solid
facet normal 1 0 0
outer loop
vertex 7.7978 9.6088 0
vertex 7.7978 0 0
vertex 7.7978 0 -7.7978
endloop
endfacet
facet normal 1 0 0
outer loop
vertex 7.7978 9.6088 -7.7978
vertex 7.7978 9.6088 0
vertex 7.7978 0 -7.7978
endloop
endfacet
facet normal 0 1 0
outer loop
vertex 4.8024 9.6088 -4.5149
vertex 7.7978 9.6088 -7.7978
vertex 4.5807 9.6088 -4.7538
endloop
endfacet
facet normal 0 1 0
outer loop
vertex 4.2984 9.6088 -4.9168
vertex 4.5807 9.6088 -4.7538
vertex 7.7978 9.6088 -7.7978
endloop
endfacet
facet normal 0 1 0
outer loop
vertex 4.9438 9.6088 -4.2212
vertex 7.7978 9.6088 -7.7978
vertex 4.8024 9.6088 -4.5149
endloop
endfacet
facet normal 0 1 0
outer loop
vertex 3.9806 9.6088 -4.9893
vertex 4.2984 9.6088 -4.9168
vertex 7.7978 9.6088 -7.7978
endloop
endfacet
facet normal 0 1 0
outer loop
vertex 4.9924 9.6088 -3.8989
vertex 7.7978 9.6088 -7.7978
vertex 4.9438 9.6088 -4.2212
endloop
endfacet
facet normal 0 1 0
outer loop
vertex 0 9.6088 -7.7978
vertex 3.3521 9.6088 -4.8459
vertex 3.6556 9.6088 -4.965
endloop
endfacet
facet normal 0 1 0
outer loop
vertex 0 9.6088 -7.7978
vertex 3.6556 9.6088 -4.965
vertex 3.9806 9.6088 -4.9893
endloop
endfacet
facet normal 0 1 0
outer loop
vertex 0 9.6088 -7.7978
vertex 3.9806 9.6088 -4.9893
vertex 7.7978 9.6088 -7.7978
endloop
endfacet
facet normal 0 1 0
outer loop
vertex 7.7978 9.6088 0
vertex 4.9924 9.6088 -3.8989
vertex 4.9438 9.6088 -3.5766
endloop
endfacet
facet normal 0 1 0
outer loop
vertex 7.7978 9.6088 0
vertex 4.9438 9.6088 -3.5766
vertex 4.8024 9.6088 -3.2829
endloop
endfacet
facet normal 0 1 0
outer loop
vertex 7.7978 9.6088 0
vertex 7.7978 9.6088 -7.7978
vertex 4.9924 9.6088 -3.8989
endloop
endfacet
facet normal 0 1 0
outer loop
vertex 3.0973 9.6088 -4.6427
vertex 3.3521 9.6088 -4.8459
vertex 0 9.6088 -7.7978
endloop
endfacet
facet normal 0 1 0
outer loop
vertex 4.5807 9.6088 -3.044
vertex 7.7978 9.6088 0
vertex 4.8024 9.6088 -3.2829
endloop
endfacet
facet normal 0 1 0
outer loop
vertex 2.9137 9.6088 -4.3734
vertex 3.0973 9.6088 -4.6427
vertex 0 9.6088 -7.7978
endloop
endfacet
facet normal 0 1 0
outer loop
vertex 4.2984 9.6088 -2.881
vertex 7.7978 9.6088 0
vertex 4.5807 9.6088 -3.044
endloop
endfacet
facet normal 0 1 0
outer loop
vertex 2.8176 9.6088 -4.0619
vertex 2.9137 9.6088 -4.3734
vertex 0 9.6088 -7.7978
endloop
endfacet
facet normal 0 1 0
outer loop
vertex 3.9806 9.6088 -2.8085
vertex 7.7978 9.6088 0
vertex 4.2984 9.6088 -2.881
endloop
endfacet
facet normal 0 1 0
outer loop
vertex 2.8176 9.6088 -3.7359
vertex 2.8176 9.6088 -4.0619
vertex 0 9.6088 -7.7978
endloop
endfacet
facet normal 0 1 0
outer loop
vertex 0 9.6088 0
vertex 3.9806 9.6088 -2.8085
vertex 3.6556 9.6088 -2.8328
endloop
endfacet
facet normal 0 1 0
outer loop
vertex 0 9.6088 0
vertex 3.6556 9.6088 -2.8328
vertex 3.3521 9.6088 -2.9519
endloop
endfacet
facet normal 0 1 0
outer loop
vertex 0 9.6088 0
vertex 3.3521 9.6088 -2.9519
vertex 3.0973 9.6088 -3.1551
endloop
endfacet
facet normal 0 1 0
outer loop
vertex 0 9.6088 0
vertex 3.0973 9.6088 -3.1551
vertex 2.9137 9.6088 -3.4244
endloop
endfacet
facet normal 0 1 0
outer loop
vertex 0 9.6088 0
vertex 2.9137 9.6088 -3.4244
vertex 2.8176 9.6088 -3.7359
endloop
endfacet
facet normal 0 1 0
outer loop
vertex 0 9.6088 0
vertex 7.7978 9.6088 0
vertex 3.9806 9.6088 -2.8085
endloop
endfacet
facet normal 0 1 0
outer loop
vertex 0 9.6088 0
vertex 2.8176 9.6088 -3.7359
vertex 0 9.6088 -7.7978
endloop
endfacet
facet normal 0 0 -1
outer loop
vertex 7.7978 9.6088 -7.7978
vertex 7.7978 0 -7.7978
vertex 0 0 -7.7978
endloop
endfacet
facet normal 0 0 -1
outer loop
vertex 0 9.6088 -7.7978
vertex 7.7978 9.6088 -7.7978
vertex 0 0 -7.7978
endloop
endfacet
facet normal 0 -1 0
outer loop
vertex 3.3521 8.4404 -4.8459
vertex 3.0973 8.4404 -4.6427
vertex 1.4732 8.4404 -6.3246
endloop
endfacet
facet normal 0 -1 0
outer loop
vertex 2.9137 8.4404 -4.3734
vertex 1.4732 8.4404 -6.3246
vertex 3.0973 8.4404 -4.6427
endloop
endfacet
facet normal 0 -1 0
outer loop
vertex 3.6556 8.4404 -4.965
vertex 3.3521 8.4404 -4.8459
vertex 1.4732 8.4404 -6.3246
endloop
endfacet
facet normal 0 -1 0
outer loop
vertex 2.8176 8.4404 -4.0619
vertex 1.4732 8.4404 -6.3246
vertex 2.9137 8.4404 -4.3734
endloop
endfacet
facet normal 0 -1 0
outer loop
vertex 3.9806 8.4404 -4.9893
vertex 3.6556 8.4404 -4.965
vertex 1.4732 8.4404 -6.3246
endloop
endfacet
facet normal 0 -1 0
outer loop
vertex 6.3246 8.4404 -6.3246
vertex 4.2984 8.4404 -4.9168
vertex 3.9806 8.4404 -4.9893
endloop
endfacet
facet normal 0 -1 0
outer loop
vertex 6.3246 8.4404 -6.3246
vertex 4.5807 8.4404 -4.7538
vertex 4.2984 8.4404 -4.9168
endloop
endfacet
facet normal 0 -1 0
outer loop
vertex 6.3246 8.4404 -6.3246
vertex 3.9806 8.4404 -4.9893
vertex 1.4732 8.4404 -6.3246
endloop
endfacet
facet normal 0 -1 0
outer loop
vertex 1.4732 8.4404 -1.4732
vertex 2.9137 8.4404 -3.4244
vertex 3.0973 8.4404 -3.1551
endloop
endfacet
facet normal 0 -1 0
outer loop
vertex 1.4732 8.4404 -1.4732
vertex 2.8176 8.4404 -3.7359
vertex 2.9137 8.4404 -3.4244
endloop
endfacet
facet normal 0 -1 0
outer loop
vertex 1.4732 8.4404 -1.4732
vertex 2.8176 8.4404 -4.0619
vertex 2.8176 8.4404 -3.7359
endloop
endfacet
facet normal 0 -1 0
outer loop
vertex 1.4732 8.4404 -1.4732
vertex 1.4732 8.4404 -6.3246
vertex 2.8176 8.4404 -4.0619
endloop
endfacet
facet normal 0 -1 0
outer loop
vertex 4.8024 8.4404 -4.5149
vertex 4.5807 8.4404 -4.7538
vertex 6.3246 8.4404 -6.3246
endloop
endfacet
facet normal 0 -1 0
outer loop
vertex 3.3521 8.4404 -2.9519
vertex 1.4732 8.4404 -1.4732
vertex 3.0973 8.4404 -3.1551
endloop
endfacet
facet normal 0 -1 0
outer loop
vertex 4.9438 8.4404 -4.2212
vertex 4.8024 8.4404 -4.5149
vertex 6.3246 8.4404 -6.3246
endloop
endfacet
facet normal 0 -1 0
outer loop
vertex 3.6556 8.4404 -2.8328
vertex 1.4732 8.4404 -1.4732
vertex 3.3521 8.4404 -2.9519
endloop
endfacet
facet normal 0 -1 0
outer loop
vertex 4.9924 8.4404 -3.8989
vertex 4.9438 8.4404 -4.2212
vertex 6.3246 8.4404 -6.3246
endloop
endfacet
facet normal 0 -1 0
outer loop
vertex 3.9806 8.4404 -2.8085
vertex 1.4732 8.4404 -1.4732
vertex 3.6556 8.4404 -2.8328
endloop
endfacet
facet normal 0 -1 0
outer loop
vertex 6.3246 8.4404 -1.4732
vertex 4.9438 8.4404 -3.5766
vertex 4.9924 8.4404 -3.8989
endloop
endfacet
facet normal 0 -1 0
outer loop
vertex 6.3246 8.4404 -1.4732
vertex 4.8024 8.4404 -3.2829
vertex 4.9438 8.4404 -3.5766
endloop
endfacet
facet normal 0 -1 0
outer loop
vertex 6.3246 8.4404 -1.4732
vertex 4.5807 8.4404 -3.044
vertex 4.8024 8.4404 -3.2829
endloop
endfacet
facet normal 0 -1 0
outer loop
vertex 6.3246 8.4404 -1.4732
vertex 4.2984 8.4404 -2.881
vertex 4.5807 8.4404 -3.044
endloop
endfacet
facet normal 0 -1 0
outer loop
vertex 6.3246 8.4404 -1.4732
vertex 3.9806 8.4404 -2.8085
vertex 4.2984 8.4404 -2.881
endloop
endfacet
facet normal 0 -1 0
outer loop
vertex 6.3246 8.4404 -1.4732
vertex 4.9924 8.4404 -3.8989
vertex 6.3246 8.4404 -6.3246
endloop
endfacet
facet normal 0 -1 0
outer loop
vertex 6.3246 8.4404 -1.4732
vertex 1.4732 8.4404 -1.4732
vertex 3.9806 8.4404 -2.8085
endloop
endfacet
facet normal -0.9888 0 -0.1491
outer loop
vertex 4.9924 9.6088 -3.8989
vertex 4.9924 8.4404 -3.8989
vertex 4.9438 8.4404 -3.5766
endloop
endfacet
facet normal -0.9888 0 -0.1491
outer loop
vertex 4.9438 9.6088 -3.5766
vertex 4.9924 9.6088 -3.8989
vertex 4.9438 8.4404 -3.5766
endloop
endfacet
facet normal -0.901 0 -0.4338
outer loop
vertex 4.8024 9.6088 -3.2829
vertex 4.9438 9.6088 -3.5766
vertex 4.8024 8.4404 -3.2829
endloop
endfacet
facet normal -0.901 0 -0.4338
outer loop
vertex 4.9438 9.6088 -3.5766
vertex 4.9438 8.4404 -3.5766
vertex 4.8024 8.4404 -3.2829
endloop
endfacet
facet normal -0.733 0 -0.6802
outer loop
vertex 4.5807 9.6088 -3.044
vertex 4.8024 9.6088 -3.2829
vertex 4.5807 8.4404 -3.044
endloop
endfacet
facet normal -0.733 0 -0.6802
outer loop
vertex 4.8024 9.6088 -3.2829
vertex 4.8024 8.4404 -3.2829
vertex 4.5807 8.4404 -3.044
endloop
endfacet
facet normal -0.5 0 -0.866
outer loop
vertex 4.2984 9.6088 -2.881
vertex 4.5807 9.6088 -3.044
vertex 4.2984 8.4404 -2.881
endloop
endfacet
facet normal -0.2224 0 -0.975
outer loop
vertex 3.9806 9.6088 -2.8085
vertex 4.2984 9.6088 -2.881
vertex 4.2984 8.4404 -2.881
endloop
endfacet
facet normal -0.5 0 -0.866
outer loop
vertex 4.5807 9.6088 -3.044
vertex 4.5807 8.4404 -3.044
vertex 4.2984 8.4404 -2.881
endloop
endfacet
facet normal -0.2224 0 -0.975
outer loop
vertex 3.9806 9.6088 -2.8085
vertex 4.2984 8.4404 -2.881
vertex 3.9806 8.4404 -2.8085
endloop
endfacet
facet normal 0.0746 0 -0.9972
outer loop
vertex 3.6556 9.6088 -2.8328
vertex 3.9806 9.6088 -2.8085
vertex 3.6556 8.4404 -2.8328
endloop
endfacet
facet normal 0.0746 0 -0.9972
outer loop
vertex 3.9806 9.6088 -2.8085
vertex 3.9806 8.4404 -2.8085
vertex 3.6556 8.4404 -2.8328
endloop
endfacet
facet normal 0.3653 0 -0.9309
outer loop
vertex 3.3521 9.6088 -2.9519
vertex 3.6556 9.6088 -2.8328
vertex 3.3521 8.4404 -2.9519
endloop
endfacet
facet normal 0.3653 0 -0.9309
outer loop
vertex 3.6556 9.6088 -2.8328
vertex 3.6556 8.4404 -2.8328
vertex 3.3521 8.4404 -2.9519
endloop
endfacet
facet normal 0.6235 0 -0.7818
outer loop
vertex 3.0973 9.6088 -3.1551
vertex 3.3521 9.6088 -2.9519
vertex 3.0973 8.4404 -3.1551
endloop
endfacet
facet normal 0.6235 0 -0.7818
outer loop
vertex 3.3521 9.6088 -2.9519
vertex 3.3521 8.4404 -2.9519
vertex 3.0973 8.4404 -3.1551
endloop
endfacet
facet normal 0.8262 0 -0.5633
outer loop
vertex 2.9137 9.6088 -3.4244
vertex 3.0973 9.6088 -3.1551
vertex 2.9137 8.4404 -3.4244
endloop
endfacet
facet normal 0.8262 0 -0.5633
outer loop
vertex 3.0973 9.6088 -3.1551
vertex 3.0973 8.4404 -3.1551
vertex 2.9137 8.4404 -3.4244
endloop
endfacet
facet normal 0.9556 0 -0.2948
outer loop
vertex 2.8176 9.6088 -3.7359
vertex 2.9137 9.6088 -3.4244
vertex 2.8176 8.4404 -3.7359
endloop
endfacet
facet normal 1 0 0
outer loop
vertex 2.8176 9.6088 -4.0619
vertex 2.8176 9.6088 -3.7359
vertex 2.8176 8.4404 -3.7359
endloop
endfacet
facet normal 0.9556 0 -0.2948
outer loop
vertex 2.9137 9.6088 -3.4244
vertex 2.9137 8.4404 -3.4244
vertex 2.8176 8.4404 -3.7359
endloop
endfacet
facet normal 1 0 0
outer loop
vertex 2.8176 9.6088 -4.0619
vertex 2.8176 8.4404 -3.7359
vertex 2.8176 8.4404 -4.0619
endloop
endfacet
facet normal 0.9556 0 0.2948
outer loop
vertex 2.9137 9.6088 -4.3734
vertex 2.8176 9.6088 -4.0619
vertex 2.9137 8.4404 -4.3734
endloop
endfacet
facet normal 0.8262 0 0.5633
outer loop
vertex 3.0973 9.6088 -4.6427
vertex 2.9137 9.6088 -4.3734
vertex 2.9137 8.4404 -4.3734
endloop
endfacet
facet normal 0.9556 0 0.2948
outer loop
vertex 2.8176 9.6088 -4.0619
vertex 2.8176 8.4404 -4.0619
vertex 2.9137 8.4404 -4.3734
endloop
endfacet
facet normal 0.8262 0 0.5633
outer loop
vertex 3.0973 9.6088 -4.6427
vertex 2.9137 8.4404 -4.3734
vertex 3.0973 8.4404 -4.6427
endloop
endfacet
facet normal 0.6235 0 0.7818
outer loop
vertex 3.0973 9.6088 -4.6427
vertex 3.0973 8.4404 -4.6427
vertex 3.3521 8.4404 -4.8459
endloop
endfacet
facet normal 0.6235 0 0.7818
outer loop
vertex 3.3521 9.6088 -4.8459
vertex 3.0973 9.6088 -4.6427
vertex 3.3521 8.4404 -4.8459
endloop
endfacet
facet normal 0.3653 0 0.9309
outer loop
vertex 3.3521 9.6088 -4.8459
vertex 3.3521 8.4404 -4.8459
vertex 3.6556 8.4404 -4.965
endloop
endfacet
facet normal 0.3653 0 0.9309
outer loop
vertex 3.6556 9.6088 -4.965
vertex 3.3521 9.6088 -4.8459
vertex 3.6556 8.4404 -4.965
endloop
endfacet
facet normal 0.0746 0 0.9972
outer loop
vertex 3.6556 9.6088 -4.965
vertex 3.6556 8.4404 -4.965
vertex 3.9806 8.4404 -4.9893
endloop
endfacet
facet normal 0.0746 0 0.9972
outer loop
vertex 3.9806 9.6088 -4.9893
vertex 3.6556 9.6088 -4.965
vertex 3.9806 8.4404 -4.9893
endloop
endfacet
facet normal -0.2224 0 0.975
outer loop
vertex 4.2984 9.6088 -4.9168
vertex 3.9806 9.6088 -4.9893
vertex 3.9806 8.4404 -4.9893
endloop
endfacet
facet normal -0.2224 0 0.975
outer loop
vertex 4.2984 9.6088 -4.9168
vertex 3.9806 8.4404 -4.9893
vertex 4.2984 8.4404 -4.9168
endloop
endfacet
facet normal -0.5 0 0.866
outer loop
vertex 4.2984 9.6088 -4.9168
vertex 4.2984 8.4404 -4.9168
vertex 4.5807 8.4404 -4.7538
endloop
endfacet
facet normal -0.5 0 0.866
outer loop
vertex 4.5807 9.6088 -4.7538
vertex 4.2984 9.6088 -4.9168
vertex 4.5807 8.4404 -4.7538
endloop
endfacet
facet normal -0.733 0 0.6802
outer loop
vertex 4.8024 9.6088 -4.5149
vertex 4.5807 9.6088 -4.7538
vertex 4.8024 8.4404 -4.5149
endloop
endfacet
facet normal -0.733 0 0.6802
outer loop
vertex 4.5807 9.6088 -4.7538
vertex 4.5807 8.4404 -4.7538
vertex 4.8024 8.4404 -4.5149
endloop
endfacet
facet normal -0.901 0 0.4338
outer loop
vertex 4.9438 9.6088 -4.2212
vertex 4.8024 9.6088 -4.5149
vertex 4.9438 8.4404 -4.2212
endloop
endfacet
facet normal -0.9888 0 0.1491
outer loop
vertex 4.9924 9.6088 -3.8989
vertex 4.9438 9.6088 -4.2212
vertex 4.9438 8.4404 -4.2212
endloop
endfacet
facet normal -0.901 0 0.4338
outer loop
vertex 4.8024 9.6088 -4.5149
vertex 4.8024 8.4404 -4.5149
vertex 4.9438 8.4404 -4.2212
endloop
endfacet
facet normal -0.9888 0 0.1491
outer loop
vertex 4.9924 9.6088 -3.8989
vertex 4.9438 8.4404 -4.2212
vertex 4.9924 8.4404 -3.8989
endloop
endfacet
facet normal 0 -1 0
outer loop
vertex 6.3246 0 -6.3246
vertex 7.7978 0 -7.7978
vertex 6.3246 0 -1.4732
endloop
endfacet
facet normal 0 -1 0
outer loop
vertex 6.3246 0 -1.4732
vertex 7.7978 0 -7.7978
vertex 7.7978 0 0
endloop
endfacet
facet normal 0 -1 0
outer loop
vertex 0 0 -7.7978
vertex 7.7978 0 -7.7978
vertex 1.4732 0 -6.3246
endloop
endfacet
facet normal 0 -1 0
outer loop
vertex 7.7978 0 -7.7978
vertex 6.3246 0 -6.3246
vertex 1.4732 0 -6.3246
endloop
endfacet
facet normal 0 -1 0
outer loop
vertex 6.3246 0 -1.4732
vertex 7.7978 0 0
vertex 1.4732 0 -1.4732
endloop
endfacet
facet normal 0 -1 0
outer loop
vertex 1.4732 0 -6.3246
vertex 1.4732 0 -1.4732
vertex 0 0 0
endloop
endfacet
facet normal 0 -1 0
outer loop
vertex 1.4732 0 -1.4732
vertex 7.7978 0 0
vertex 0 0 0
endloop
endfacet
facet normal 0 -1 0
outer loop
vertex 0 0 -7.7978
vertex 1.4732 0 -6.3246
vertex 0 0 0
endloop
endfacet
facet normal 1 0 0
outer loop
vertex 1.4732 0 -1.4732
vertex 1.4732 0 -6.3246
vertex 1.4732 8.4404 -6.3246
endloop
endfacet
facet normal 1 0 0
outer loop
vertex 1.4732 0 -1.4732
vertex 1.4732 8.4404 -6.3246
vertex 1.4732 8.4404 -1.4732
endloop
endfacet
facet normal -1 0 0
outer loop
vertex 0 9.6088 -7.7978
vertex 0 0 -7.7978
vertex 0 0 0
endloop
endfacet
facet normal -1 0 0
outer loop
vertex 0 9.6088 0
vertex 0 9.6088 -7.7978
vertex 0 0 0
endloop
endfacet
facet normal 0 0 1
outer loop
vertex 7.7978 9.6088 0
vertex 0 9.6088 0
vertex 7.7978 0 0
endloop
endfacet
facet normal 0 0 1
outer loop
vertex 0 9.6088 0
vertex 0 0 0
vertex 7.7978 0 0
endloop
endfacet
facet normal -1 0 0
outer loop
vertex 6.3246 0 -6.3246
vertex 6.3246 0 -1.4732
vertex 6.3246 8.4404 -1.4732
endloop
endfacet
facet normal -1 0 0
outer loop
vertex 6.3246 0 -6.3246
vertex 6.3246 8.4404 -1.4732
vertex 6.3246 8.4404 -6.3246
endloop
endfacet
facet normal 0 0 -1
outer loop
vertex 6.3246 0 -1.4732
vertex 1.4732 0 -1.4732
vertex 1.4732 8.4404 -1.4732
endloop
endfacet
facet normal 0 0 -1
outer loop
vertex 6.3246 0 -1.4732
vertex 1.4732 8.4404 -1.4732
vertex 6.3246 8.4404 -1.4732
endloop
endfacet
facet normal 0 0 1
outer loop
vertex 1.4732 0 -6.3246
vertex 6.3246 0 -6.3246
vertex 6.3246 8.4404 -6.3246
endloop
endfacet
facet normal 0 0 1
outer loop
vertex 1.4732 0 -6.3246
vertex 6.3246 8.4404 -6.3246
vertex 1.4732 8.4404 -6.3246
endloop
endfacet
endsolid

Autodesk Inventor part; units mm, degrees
ref_plane "YZ Plane" through (0, 0, 0) normal (1, 0, 0) x (0, 1, 0)
ref_plane "XZ Plane" through (0, 0, 0) normal (0, 1, 0) x (-1, 0, 0)
ref_plane "XY Plane" through (0, 0, 0) normal (0, 0, 1) x (1, 0, 0)
sketch "Sketch1" plane through (0, 0, 0) normal (0, 1, 0) x (-1, 0, 0)
  line L0 (0, 0) -> (-7.7978, 0)
  line L1 (-7.7978, 0) -> (-7.7978, -7.7978)
  line L2 (-7.7978, -7.7978) -> (0, -7.7978)
  line L3 (0, -7.7978) -> (0, 0)
  dimension "d0" = 7.7978
  dimension "d1" = 7.7978
extrude "Extrusion1" add sketch "Sketch1" along normal blind 9.6088
shell "Shell1" thickness 1.4732 removed faces 1 at (5.1985, 0, -2.5993)
sketch "Sketch2" plane through (1.4732, 8.1356, -1.4732) normal (0, -1, 0) x (1, 0, 0)
  line L0 (0, -4.8514) -> (0, 0) projected
  line L1 (4.8514, 0) -> (4.8514, -4.8514) projected
  line L2 (0, 0) -> (4.8514, 0)
  line L3 (4.8514, 0) -> (4.8514, -4.8514)
  line L4 (4.8514, -4.8514) -> (0, -4.8514)
  line L5 (0, -4.8514) -> (0, 0)
  point P0 (-1.4732, 1.4732)
extrude "Extrusion2" cut sketch "Sketch2" against normal blind 0.3048
sketch "Sketch3" plane through (1.4732, 8.4404, -1.4732) normal (0, -1, 0) x (1, 0, 0)
  line L0 (0, 0) -> (4.8514, 0) construction
  line L1 (4.8514, 0) -> (4.8514, -4.8514) construction
  line L2 (4.8514, -4.8514) -> (0, -4.8514) construction
  line L3 (0, -4.8514) -> (0, 0) construction
  line L4 (0, -4.8514) -> (0, 0) construction
  line L5 (0, -2.4257) -> (4.8514, -2.4257) construction
  line L6 (0, 0) -> (4.8514, 0) construction
  line L7 (2.4257, 0) -> (2.4257, -4.8514) construction
  circle A0 centre (2.4257, -2.4257) radius 1.0935
  point P0 (-1.4732, 1.4732)
  dimension "d7" = 2.1869
extrude "Extrusion3" cut sketch "Sketch3" against normal blind 1.27
properties part number "Sample 1x1 tall" material "ABS Plastic"
